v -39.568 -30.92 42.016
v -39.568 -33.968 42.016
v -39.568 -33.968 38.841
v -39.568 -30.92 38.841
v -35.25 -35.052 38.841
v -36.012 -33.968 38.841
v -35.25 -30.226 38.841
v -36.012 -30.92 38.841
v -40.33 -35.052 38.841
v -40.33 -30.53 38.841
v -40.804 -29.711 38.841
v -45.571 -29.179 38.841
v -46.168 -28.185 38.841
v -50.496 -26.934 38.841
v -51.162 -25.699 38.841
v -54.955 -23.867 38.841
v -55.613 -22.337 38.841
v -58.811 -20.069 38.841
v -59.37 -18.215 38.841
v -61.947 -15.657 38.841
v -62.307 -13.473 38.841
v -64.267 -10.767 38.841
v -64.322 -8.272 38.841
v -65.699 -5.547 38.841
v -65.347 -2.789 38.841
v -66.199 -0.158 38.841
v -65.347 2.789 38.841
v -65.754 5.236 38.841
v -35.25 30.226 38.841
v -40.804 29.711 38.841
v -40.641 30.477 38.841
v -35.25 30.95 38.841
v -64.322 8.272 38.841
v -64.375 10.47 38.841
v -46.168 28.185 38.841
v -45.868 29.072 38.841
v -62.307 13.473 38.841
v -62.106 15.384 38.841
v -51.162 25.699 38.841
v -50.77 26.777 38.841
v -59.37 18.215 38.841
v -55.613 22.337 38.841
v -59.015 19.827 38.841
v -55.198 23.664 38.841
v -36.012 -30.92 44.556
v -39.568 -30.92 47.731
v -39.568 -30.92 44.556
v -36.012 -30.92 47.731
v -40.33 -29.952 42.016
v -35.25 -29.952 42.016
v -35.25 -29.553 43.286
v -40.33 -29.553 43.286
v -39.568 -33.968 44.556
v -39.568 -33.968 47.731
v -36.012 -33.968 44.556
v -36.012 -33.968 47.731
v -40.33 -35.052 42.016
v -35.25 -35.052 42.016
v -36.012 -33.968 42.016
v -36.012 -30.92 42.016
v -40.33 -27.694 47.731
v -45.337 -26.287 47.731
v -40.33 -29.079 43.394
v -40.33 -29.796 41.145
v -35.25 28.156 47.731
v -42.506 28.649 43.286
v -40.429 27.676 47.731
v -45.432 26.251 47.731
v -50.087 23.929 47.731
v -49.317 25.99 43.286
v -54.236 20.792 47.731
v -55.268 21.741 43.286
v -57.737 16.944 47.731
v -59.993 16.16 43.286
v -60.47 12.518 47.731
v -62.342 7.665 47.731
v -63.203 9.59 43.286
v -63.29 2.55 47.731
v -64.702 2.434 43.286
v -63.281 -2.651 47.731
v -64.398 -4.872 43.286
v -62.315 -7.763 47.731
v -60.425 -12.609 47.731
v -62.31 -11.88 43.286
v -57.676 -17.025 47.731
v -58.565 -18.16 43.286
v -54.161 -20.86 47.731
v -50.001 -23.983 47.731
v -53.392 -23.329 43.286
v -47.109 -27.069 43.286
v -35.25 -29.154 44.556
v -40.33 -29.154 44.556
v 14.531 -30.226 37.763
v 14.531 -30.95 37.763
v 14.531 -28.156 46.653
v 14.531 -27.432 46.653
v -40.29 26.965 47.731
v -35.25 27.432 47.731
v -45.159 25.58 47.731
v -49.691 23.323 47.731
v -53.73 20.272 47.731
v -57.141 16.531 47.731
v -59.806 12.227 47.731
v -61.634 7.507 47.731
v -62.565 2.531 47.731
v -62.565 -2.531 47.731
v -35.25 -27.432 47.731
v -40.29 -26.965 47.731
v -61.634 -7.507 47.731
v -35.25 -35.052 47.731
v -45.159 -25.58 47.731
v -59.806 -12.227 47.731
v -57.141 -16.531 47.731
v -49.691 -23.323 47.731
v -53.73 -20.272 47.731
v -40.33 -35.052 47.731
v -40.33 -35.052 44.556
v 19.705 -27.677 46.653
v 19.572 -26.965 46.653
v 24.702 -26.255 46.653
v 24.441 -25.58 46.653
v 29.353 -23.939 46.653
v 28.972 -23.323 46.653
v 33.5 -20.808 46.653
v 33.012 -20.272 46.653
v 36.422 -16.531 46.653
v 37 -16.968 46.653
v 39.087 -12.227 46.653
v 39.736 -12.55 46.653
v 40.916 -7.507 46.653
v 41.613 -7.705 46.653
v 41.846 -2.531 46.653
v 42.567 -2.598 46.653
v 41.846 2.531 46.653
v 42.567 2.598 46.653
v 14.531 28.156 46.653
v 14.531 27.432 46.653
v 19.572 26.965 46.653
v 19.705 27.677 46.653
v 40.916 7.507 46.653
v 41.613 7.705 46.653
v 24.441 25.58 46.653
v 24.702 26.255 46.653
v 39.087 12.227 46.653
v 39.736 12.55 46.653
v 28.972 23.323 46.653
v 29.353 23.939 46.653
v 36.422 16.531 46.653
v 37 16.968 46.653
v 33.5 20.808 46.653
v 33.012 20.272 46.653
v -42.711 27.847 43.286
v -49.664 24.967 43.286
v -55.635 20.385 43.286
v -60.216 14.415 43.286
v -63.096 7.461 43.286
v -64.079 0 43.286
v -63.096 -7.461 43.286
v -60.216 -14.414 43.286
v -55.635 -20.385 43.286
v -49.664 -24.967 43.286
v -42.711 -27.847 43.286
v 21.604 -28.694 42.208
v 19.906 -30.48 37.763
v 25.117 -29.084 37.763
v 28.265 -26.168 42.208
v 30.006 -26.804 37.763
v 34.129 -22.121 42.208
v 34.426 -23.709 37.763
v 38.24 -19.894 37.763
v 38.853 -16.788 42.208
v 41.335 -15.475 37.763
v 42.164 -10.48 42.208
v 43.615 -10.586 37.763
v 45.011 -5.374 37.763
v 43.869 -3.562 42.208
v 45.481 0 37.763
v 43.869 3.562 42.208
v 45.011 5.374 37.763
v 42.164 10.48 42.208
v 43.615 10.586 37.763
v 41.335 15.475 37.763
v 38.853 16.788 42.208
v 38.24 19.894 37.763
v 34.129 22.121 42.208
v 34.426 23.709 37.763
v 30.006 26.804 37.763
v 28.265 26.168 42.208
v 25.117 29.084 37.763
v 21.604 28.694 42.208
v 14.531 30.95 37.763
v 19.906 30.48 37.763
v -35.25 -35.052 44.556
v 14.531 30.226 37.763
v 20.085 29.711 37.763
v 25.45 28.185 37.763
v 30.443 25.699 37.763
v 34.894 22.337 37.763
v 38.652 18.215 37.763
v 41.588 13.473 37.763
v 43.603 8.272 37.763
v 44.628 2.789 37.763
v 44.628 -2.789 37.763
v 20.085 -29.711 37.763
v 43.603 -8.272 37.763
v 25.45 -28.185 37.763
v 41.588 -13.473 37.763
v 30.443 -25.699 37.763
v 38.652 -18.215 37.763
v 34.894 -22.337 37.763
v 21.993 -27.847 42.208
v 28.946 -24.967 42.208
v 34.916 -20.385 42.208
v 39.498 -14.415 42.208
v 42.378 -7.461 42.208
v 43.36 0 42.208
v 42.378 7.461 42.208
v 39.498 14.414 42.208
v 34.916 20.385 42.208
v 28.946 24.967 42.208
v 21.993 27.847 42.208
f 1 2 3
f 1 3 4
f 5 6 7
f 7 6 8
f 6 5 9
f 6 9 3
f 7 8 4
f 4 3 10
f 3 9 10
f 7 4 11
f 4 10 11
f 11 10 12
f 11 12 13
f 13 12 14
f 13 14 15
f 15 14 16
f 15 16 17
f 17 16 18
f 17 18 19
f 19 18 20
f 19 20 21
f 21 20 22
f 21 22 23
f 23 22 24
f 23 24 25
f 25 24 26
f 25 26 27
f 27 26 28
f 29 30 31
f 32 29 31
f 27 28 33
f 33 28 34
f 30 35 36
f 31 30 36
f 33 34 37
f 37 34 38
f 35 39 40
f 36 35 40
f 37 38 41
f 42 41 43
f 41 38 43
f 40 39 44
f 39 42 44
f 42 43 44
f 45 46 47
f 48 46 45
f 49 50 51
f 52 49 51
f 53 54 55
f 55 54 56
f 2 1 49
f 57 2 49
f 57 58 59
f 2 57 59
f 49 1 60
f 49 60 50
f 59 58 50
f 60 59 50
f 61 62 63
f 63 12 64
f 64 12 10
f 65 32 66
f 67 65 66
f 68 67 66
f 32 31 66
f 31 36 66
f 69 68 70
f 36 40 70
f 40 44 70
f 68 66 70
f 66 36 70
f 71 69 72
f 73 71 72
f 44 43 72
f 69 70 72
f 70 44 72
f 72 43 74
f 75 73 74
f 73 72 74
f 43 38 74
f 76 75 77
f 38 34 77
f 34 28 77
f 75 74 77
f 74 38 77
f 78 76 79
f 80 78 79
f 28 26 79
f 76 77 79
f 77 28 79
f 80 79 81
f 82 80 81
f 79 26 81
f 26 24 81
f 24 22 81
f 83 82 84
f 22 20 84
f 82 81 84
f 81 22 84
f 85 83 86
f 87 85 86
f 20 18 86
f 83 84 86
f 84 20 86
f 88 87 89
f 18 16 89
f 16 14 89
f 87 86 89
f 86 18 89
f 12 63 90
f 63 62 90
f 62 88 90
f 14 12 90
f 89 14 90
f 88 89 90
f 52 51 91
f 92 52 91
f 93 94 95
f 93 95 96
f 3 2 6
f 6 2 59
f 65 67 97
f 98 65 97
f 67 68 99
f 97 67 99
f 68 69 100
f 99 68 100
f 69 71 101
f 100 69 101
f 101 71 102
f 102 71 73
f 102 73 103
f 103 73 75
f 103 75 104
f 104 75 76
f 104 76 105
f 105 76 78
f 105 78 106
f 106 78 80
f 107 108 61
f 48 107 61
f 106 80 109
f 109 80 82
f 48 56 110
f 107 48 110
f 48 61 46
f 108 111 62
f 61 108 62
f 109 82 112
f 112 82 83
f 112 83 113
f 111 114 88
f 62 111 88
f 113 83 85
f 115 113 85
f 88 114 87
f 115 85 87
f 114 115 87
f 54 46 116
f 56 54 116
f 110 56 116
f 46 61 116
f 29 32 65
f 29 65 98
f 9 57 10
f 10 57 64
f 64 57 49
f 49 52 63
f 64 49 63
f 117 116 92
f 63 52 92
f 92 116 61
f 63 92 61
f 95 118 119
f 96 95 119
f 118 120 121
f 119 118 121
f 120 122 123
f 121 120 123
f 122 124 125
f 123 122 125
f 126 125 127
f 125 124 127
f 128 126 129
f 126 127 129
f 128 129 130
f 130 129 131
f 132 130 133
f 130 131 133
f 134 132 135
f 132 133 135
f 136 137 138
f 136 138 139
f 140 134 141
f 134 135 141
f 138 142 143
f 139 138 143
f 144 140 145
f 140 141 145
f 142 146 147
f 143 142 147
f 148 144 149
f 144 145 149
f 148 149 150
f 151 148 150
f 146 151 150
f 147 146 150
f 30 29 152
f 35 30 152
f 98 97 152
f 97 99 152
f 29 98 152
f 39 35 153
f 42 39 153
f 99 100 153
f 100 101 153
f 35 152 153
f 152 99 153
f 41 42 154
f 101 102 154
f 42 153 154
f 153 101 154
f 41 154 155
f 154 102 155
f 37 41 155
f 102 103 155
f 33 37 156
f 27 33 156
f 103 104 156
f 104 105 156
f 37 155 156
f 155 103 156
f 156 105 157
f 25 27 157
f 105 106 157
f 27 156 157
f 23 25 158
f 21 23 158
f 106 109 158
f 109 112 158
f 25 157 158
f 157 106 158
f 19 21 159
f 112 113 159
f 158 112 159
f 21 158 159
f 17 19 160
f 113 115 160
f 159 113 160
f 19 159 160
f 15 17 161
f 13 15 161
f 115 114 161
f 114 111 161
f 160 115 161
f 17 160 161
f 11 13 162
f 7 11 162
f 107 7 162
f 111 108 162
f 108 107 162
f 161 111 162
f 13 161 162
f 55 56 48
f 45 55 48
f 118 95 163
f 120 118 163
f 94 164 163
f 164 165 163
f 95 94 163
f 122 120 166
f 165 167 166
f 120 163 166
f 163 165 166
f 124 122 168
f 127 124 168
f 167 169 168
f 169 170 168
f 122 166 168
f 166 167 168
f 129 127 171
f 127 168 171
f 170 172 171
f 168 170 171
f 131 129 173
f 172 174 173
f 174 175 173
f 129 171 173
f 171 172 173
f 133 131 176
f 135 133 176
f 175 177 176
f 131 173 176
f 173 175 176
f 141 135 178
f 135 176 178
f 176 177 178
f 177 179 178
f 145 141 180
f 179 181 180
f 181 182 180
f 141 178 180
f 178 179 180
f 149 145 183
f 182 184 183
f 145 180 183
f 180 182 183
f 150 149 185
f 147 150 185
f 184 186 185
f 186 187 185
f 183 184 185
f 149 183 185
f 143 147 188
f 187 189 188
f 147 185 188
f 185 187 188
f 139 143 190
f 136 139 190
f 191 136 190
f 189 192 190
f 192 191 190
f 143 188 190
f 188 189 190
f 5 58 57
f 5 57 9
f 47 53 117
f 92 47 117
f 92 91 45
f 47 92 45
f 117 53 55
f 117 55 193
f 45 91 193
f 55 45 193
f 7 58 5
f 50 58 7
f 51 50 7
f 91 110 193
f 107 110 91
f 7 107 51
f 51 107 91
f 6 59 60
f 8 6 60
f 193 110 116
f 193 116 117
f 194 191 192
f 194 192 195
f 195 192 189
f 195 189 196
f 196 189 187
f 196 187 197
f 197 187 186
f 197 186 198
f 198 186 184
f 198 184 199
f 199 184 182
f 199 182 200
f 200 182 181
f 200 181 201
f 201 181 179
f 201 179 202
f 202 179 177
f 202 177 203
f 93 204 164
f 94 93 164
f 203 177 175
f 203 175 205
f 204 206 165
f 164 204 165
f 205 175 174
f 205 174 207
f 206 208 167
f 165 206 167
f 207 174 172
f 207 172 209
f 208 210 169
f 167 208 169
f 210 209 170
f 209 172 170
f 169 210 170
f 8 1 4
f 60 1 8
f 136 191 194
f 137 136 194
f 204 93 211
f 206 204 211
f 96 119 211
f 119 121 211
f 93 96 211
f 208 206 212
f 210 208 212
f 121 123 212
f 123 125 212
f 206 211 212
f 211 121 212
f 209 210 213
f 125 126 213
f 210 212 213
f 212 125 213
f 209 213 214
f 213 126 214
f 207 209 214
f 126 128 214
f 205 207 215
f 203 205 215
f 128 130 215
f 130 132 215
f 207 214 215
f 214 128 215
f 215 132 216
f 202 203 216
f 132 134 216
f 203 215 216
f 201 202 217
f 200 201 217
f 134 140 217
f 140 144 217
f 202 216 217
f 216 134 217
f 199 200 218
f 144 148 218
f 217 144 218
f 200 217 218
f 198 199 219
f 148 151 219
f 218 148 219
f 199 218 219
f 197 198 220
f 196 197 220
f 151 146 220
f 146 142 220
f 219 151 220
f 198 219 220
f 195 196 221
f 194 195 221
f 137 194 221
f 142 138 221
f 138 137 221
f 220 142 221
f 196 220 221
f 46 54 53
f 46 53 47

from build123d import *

# Parameters (mm, degrees)
F1_ANGLE_BACK  = 90
F1_ANGLE       = 180
F2_ANGLE_START = 90
F2_ANGLE       = 180
F4_DEPTH       = 5.08
F5_DEPTH       = 5.08
F6_W           = 3.556
F6_H           = 3.048
F7_DEPTH       = 25.4


with BuildPart() as f1:
    # F0 (on Front) → F1 (revolve)
    with BuildSketch(Plane.XZ, mode=Mode.PRIVATE) as f1_sk:
        Polygon((-62.6815780775, 47.7310680375), (-63.4057742764, 47.7310680375), (-66.1997742764, 38.8410680375), (-65.4755780775, 38.8410680375), align=None)
    revolve(f1_sk.sketch.rotate(Axis((-35.2495780775, 0, 43.2860680375), (0, 0, 1)), -F1_ANGLE_BACK), axis=Axis((-35.2495780775, 0, 43.2860680375), (0, 0, 1)), revolution_arc=F1_ANGLE)

    # F3 (on face) → F4 (join)
    with BuildSketch(Plane.YZ.offset(-35.2495780775)):
        Polygon((-30.226, 38.8410680375), (-27.432, 47.7310680375), (-28.1561961989, 47.7310680375), (-29.1540533418, 44.5560680375), (-29.5531961989, 43.2860680375), (-29.9523390561, 42.0160680375), (-30.9501961989, 38.8410680375), align=None)
        Polygon((-29.1540533418, 44.5560680375), (-28.1561961989, 47.7310680375), (-35.052, 47.7310680375), (-35.052, 44.5560680375), align=None)
        Polygon((-29.5531961989, 43.2860680375), (-29.1540533418, 44.5560680375), (-35.052, 44.5560680375), (-35.052, 43.2860680375), align=None)
        Polygon((-29.9523390561, 42.0160680375), (-29.5531961989, 43.2860680375), (-35.052, 43.2860680375), (-35.052, 42.0160680375), align=None)
        Polygon((-35.052, 38.8410680375), (-30.9501961989, 38.8410680375), (-29.9523390561, 42.0160680375), (-35.052, 42.0160680375), align=None)
    extrude(amount=-F4_DEPTH)

    # F3 (on face) → F5 (cut)
    with BuildSketch(Plane.YZ.offset(-35.2495780775)):
        Polygon((-29.5531961989, 43.2860680375), (-29.1540533418, 44.5560680375), (-35.052, 44.5560680375), (-35.052, 43.2860680375), align=None)
        Polygon((-29.9523390561, 42.0160680375), (-29.5531961989, 43.2860680375), (-35.052, 43.2860680375), (-35.052, 42.0160680375), align=None)
    extrude(amount=-F5_DEPTH, mode=Mode.SUBTRACT)

    # F6 (on face) → F7 (cut)
    with BuildSketch(Plane.XY.offset(47.7310680375)):
        with Locations((-37.7895780775, -32.4442176709)):
            Rectangle(F6_W, F6_H)
    extrude(amount=-F7_DEPTH, mode=Mode.SUBTRACT)


with BuildPart() as f2:
    # F0 (on Front) → F2 (revolve)
    with BuildSketch(Plane.XZ, mode=Mode.PRIVATE) as f2_sk:
        Polygon((-12.9008494282, 46.6531522715), (-13.6250456271, 46.6531522715), (-16.4190456271, 37.7631522715), (-15.6948494282, 37.7631522715), align=None)
    revolve(f2_sk.sketch.rotate(Axis((14.5311505718, 0, 42.2081522715), (0, 0, 1)), F2_ANGLE_START), axis=Axis((14.5311505718, 0, 42.2081522715), (0, 0, 1)), revolution_arc=F2_ANGLE)


solid = Compound([f1.part, f2.part])
